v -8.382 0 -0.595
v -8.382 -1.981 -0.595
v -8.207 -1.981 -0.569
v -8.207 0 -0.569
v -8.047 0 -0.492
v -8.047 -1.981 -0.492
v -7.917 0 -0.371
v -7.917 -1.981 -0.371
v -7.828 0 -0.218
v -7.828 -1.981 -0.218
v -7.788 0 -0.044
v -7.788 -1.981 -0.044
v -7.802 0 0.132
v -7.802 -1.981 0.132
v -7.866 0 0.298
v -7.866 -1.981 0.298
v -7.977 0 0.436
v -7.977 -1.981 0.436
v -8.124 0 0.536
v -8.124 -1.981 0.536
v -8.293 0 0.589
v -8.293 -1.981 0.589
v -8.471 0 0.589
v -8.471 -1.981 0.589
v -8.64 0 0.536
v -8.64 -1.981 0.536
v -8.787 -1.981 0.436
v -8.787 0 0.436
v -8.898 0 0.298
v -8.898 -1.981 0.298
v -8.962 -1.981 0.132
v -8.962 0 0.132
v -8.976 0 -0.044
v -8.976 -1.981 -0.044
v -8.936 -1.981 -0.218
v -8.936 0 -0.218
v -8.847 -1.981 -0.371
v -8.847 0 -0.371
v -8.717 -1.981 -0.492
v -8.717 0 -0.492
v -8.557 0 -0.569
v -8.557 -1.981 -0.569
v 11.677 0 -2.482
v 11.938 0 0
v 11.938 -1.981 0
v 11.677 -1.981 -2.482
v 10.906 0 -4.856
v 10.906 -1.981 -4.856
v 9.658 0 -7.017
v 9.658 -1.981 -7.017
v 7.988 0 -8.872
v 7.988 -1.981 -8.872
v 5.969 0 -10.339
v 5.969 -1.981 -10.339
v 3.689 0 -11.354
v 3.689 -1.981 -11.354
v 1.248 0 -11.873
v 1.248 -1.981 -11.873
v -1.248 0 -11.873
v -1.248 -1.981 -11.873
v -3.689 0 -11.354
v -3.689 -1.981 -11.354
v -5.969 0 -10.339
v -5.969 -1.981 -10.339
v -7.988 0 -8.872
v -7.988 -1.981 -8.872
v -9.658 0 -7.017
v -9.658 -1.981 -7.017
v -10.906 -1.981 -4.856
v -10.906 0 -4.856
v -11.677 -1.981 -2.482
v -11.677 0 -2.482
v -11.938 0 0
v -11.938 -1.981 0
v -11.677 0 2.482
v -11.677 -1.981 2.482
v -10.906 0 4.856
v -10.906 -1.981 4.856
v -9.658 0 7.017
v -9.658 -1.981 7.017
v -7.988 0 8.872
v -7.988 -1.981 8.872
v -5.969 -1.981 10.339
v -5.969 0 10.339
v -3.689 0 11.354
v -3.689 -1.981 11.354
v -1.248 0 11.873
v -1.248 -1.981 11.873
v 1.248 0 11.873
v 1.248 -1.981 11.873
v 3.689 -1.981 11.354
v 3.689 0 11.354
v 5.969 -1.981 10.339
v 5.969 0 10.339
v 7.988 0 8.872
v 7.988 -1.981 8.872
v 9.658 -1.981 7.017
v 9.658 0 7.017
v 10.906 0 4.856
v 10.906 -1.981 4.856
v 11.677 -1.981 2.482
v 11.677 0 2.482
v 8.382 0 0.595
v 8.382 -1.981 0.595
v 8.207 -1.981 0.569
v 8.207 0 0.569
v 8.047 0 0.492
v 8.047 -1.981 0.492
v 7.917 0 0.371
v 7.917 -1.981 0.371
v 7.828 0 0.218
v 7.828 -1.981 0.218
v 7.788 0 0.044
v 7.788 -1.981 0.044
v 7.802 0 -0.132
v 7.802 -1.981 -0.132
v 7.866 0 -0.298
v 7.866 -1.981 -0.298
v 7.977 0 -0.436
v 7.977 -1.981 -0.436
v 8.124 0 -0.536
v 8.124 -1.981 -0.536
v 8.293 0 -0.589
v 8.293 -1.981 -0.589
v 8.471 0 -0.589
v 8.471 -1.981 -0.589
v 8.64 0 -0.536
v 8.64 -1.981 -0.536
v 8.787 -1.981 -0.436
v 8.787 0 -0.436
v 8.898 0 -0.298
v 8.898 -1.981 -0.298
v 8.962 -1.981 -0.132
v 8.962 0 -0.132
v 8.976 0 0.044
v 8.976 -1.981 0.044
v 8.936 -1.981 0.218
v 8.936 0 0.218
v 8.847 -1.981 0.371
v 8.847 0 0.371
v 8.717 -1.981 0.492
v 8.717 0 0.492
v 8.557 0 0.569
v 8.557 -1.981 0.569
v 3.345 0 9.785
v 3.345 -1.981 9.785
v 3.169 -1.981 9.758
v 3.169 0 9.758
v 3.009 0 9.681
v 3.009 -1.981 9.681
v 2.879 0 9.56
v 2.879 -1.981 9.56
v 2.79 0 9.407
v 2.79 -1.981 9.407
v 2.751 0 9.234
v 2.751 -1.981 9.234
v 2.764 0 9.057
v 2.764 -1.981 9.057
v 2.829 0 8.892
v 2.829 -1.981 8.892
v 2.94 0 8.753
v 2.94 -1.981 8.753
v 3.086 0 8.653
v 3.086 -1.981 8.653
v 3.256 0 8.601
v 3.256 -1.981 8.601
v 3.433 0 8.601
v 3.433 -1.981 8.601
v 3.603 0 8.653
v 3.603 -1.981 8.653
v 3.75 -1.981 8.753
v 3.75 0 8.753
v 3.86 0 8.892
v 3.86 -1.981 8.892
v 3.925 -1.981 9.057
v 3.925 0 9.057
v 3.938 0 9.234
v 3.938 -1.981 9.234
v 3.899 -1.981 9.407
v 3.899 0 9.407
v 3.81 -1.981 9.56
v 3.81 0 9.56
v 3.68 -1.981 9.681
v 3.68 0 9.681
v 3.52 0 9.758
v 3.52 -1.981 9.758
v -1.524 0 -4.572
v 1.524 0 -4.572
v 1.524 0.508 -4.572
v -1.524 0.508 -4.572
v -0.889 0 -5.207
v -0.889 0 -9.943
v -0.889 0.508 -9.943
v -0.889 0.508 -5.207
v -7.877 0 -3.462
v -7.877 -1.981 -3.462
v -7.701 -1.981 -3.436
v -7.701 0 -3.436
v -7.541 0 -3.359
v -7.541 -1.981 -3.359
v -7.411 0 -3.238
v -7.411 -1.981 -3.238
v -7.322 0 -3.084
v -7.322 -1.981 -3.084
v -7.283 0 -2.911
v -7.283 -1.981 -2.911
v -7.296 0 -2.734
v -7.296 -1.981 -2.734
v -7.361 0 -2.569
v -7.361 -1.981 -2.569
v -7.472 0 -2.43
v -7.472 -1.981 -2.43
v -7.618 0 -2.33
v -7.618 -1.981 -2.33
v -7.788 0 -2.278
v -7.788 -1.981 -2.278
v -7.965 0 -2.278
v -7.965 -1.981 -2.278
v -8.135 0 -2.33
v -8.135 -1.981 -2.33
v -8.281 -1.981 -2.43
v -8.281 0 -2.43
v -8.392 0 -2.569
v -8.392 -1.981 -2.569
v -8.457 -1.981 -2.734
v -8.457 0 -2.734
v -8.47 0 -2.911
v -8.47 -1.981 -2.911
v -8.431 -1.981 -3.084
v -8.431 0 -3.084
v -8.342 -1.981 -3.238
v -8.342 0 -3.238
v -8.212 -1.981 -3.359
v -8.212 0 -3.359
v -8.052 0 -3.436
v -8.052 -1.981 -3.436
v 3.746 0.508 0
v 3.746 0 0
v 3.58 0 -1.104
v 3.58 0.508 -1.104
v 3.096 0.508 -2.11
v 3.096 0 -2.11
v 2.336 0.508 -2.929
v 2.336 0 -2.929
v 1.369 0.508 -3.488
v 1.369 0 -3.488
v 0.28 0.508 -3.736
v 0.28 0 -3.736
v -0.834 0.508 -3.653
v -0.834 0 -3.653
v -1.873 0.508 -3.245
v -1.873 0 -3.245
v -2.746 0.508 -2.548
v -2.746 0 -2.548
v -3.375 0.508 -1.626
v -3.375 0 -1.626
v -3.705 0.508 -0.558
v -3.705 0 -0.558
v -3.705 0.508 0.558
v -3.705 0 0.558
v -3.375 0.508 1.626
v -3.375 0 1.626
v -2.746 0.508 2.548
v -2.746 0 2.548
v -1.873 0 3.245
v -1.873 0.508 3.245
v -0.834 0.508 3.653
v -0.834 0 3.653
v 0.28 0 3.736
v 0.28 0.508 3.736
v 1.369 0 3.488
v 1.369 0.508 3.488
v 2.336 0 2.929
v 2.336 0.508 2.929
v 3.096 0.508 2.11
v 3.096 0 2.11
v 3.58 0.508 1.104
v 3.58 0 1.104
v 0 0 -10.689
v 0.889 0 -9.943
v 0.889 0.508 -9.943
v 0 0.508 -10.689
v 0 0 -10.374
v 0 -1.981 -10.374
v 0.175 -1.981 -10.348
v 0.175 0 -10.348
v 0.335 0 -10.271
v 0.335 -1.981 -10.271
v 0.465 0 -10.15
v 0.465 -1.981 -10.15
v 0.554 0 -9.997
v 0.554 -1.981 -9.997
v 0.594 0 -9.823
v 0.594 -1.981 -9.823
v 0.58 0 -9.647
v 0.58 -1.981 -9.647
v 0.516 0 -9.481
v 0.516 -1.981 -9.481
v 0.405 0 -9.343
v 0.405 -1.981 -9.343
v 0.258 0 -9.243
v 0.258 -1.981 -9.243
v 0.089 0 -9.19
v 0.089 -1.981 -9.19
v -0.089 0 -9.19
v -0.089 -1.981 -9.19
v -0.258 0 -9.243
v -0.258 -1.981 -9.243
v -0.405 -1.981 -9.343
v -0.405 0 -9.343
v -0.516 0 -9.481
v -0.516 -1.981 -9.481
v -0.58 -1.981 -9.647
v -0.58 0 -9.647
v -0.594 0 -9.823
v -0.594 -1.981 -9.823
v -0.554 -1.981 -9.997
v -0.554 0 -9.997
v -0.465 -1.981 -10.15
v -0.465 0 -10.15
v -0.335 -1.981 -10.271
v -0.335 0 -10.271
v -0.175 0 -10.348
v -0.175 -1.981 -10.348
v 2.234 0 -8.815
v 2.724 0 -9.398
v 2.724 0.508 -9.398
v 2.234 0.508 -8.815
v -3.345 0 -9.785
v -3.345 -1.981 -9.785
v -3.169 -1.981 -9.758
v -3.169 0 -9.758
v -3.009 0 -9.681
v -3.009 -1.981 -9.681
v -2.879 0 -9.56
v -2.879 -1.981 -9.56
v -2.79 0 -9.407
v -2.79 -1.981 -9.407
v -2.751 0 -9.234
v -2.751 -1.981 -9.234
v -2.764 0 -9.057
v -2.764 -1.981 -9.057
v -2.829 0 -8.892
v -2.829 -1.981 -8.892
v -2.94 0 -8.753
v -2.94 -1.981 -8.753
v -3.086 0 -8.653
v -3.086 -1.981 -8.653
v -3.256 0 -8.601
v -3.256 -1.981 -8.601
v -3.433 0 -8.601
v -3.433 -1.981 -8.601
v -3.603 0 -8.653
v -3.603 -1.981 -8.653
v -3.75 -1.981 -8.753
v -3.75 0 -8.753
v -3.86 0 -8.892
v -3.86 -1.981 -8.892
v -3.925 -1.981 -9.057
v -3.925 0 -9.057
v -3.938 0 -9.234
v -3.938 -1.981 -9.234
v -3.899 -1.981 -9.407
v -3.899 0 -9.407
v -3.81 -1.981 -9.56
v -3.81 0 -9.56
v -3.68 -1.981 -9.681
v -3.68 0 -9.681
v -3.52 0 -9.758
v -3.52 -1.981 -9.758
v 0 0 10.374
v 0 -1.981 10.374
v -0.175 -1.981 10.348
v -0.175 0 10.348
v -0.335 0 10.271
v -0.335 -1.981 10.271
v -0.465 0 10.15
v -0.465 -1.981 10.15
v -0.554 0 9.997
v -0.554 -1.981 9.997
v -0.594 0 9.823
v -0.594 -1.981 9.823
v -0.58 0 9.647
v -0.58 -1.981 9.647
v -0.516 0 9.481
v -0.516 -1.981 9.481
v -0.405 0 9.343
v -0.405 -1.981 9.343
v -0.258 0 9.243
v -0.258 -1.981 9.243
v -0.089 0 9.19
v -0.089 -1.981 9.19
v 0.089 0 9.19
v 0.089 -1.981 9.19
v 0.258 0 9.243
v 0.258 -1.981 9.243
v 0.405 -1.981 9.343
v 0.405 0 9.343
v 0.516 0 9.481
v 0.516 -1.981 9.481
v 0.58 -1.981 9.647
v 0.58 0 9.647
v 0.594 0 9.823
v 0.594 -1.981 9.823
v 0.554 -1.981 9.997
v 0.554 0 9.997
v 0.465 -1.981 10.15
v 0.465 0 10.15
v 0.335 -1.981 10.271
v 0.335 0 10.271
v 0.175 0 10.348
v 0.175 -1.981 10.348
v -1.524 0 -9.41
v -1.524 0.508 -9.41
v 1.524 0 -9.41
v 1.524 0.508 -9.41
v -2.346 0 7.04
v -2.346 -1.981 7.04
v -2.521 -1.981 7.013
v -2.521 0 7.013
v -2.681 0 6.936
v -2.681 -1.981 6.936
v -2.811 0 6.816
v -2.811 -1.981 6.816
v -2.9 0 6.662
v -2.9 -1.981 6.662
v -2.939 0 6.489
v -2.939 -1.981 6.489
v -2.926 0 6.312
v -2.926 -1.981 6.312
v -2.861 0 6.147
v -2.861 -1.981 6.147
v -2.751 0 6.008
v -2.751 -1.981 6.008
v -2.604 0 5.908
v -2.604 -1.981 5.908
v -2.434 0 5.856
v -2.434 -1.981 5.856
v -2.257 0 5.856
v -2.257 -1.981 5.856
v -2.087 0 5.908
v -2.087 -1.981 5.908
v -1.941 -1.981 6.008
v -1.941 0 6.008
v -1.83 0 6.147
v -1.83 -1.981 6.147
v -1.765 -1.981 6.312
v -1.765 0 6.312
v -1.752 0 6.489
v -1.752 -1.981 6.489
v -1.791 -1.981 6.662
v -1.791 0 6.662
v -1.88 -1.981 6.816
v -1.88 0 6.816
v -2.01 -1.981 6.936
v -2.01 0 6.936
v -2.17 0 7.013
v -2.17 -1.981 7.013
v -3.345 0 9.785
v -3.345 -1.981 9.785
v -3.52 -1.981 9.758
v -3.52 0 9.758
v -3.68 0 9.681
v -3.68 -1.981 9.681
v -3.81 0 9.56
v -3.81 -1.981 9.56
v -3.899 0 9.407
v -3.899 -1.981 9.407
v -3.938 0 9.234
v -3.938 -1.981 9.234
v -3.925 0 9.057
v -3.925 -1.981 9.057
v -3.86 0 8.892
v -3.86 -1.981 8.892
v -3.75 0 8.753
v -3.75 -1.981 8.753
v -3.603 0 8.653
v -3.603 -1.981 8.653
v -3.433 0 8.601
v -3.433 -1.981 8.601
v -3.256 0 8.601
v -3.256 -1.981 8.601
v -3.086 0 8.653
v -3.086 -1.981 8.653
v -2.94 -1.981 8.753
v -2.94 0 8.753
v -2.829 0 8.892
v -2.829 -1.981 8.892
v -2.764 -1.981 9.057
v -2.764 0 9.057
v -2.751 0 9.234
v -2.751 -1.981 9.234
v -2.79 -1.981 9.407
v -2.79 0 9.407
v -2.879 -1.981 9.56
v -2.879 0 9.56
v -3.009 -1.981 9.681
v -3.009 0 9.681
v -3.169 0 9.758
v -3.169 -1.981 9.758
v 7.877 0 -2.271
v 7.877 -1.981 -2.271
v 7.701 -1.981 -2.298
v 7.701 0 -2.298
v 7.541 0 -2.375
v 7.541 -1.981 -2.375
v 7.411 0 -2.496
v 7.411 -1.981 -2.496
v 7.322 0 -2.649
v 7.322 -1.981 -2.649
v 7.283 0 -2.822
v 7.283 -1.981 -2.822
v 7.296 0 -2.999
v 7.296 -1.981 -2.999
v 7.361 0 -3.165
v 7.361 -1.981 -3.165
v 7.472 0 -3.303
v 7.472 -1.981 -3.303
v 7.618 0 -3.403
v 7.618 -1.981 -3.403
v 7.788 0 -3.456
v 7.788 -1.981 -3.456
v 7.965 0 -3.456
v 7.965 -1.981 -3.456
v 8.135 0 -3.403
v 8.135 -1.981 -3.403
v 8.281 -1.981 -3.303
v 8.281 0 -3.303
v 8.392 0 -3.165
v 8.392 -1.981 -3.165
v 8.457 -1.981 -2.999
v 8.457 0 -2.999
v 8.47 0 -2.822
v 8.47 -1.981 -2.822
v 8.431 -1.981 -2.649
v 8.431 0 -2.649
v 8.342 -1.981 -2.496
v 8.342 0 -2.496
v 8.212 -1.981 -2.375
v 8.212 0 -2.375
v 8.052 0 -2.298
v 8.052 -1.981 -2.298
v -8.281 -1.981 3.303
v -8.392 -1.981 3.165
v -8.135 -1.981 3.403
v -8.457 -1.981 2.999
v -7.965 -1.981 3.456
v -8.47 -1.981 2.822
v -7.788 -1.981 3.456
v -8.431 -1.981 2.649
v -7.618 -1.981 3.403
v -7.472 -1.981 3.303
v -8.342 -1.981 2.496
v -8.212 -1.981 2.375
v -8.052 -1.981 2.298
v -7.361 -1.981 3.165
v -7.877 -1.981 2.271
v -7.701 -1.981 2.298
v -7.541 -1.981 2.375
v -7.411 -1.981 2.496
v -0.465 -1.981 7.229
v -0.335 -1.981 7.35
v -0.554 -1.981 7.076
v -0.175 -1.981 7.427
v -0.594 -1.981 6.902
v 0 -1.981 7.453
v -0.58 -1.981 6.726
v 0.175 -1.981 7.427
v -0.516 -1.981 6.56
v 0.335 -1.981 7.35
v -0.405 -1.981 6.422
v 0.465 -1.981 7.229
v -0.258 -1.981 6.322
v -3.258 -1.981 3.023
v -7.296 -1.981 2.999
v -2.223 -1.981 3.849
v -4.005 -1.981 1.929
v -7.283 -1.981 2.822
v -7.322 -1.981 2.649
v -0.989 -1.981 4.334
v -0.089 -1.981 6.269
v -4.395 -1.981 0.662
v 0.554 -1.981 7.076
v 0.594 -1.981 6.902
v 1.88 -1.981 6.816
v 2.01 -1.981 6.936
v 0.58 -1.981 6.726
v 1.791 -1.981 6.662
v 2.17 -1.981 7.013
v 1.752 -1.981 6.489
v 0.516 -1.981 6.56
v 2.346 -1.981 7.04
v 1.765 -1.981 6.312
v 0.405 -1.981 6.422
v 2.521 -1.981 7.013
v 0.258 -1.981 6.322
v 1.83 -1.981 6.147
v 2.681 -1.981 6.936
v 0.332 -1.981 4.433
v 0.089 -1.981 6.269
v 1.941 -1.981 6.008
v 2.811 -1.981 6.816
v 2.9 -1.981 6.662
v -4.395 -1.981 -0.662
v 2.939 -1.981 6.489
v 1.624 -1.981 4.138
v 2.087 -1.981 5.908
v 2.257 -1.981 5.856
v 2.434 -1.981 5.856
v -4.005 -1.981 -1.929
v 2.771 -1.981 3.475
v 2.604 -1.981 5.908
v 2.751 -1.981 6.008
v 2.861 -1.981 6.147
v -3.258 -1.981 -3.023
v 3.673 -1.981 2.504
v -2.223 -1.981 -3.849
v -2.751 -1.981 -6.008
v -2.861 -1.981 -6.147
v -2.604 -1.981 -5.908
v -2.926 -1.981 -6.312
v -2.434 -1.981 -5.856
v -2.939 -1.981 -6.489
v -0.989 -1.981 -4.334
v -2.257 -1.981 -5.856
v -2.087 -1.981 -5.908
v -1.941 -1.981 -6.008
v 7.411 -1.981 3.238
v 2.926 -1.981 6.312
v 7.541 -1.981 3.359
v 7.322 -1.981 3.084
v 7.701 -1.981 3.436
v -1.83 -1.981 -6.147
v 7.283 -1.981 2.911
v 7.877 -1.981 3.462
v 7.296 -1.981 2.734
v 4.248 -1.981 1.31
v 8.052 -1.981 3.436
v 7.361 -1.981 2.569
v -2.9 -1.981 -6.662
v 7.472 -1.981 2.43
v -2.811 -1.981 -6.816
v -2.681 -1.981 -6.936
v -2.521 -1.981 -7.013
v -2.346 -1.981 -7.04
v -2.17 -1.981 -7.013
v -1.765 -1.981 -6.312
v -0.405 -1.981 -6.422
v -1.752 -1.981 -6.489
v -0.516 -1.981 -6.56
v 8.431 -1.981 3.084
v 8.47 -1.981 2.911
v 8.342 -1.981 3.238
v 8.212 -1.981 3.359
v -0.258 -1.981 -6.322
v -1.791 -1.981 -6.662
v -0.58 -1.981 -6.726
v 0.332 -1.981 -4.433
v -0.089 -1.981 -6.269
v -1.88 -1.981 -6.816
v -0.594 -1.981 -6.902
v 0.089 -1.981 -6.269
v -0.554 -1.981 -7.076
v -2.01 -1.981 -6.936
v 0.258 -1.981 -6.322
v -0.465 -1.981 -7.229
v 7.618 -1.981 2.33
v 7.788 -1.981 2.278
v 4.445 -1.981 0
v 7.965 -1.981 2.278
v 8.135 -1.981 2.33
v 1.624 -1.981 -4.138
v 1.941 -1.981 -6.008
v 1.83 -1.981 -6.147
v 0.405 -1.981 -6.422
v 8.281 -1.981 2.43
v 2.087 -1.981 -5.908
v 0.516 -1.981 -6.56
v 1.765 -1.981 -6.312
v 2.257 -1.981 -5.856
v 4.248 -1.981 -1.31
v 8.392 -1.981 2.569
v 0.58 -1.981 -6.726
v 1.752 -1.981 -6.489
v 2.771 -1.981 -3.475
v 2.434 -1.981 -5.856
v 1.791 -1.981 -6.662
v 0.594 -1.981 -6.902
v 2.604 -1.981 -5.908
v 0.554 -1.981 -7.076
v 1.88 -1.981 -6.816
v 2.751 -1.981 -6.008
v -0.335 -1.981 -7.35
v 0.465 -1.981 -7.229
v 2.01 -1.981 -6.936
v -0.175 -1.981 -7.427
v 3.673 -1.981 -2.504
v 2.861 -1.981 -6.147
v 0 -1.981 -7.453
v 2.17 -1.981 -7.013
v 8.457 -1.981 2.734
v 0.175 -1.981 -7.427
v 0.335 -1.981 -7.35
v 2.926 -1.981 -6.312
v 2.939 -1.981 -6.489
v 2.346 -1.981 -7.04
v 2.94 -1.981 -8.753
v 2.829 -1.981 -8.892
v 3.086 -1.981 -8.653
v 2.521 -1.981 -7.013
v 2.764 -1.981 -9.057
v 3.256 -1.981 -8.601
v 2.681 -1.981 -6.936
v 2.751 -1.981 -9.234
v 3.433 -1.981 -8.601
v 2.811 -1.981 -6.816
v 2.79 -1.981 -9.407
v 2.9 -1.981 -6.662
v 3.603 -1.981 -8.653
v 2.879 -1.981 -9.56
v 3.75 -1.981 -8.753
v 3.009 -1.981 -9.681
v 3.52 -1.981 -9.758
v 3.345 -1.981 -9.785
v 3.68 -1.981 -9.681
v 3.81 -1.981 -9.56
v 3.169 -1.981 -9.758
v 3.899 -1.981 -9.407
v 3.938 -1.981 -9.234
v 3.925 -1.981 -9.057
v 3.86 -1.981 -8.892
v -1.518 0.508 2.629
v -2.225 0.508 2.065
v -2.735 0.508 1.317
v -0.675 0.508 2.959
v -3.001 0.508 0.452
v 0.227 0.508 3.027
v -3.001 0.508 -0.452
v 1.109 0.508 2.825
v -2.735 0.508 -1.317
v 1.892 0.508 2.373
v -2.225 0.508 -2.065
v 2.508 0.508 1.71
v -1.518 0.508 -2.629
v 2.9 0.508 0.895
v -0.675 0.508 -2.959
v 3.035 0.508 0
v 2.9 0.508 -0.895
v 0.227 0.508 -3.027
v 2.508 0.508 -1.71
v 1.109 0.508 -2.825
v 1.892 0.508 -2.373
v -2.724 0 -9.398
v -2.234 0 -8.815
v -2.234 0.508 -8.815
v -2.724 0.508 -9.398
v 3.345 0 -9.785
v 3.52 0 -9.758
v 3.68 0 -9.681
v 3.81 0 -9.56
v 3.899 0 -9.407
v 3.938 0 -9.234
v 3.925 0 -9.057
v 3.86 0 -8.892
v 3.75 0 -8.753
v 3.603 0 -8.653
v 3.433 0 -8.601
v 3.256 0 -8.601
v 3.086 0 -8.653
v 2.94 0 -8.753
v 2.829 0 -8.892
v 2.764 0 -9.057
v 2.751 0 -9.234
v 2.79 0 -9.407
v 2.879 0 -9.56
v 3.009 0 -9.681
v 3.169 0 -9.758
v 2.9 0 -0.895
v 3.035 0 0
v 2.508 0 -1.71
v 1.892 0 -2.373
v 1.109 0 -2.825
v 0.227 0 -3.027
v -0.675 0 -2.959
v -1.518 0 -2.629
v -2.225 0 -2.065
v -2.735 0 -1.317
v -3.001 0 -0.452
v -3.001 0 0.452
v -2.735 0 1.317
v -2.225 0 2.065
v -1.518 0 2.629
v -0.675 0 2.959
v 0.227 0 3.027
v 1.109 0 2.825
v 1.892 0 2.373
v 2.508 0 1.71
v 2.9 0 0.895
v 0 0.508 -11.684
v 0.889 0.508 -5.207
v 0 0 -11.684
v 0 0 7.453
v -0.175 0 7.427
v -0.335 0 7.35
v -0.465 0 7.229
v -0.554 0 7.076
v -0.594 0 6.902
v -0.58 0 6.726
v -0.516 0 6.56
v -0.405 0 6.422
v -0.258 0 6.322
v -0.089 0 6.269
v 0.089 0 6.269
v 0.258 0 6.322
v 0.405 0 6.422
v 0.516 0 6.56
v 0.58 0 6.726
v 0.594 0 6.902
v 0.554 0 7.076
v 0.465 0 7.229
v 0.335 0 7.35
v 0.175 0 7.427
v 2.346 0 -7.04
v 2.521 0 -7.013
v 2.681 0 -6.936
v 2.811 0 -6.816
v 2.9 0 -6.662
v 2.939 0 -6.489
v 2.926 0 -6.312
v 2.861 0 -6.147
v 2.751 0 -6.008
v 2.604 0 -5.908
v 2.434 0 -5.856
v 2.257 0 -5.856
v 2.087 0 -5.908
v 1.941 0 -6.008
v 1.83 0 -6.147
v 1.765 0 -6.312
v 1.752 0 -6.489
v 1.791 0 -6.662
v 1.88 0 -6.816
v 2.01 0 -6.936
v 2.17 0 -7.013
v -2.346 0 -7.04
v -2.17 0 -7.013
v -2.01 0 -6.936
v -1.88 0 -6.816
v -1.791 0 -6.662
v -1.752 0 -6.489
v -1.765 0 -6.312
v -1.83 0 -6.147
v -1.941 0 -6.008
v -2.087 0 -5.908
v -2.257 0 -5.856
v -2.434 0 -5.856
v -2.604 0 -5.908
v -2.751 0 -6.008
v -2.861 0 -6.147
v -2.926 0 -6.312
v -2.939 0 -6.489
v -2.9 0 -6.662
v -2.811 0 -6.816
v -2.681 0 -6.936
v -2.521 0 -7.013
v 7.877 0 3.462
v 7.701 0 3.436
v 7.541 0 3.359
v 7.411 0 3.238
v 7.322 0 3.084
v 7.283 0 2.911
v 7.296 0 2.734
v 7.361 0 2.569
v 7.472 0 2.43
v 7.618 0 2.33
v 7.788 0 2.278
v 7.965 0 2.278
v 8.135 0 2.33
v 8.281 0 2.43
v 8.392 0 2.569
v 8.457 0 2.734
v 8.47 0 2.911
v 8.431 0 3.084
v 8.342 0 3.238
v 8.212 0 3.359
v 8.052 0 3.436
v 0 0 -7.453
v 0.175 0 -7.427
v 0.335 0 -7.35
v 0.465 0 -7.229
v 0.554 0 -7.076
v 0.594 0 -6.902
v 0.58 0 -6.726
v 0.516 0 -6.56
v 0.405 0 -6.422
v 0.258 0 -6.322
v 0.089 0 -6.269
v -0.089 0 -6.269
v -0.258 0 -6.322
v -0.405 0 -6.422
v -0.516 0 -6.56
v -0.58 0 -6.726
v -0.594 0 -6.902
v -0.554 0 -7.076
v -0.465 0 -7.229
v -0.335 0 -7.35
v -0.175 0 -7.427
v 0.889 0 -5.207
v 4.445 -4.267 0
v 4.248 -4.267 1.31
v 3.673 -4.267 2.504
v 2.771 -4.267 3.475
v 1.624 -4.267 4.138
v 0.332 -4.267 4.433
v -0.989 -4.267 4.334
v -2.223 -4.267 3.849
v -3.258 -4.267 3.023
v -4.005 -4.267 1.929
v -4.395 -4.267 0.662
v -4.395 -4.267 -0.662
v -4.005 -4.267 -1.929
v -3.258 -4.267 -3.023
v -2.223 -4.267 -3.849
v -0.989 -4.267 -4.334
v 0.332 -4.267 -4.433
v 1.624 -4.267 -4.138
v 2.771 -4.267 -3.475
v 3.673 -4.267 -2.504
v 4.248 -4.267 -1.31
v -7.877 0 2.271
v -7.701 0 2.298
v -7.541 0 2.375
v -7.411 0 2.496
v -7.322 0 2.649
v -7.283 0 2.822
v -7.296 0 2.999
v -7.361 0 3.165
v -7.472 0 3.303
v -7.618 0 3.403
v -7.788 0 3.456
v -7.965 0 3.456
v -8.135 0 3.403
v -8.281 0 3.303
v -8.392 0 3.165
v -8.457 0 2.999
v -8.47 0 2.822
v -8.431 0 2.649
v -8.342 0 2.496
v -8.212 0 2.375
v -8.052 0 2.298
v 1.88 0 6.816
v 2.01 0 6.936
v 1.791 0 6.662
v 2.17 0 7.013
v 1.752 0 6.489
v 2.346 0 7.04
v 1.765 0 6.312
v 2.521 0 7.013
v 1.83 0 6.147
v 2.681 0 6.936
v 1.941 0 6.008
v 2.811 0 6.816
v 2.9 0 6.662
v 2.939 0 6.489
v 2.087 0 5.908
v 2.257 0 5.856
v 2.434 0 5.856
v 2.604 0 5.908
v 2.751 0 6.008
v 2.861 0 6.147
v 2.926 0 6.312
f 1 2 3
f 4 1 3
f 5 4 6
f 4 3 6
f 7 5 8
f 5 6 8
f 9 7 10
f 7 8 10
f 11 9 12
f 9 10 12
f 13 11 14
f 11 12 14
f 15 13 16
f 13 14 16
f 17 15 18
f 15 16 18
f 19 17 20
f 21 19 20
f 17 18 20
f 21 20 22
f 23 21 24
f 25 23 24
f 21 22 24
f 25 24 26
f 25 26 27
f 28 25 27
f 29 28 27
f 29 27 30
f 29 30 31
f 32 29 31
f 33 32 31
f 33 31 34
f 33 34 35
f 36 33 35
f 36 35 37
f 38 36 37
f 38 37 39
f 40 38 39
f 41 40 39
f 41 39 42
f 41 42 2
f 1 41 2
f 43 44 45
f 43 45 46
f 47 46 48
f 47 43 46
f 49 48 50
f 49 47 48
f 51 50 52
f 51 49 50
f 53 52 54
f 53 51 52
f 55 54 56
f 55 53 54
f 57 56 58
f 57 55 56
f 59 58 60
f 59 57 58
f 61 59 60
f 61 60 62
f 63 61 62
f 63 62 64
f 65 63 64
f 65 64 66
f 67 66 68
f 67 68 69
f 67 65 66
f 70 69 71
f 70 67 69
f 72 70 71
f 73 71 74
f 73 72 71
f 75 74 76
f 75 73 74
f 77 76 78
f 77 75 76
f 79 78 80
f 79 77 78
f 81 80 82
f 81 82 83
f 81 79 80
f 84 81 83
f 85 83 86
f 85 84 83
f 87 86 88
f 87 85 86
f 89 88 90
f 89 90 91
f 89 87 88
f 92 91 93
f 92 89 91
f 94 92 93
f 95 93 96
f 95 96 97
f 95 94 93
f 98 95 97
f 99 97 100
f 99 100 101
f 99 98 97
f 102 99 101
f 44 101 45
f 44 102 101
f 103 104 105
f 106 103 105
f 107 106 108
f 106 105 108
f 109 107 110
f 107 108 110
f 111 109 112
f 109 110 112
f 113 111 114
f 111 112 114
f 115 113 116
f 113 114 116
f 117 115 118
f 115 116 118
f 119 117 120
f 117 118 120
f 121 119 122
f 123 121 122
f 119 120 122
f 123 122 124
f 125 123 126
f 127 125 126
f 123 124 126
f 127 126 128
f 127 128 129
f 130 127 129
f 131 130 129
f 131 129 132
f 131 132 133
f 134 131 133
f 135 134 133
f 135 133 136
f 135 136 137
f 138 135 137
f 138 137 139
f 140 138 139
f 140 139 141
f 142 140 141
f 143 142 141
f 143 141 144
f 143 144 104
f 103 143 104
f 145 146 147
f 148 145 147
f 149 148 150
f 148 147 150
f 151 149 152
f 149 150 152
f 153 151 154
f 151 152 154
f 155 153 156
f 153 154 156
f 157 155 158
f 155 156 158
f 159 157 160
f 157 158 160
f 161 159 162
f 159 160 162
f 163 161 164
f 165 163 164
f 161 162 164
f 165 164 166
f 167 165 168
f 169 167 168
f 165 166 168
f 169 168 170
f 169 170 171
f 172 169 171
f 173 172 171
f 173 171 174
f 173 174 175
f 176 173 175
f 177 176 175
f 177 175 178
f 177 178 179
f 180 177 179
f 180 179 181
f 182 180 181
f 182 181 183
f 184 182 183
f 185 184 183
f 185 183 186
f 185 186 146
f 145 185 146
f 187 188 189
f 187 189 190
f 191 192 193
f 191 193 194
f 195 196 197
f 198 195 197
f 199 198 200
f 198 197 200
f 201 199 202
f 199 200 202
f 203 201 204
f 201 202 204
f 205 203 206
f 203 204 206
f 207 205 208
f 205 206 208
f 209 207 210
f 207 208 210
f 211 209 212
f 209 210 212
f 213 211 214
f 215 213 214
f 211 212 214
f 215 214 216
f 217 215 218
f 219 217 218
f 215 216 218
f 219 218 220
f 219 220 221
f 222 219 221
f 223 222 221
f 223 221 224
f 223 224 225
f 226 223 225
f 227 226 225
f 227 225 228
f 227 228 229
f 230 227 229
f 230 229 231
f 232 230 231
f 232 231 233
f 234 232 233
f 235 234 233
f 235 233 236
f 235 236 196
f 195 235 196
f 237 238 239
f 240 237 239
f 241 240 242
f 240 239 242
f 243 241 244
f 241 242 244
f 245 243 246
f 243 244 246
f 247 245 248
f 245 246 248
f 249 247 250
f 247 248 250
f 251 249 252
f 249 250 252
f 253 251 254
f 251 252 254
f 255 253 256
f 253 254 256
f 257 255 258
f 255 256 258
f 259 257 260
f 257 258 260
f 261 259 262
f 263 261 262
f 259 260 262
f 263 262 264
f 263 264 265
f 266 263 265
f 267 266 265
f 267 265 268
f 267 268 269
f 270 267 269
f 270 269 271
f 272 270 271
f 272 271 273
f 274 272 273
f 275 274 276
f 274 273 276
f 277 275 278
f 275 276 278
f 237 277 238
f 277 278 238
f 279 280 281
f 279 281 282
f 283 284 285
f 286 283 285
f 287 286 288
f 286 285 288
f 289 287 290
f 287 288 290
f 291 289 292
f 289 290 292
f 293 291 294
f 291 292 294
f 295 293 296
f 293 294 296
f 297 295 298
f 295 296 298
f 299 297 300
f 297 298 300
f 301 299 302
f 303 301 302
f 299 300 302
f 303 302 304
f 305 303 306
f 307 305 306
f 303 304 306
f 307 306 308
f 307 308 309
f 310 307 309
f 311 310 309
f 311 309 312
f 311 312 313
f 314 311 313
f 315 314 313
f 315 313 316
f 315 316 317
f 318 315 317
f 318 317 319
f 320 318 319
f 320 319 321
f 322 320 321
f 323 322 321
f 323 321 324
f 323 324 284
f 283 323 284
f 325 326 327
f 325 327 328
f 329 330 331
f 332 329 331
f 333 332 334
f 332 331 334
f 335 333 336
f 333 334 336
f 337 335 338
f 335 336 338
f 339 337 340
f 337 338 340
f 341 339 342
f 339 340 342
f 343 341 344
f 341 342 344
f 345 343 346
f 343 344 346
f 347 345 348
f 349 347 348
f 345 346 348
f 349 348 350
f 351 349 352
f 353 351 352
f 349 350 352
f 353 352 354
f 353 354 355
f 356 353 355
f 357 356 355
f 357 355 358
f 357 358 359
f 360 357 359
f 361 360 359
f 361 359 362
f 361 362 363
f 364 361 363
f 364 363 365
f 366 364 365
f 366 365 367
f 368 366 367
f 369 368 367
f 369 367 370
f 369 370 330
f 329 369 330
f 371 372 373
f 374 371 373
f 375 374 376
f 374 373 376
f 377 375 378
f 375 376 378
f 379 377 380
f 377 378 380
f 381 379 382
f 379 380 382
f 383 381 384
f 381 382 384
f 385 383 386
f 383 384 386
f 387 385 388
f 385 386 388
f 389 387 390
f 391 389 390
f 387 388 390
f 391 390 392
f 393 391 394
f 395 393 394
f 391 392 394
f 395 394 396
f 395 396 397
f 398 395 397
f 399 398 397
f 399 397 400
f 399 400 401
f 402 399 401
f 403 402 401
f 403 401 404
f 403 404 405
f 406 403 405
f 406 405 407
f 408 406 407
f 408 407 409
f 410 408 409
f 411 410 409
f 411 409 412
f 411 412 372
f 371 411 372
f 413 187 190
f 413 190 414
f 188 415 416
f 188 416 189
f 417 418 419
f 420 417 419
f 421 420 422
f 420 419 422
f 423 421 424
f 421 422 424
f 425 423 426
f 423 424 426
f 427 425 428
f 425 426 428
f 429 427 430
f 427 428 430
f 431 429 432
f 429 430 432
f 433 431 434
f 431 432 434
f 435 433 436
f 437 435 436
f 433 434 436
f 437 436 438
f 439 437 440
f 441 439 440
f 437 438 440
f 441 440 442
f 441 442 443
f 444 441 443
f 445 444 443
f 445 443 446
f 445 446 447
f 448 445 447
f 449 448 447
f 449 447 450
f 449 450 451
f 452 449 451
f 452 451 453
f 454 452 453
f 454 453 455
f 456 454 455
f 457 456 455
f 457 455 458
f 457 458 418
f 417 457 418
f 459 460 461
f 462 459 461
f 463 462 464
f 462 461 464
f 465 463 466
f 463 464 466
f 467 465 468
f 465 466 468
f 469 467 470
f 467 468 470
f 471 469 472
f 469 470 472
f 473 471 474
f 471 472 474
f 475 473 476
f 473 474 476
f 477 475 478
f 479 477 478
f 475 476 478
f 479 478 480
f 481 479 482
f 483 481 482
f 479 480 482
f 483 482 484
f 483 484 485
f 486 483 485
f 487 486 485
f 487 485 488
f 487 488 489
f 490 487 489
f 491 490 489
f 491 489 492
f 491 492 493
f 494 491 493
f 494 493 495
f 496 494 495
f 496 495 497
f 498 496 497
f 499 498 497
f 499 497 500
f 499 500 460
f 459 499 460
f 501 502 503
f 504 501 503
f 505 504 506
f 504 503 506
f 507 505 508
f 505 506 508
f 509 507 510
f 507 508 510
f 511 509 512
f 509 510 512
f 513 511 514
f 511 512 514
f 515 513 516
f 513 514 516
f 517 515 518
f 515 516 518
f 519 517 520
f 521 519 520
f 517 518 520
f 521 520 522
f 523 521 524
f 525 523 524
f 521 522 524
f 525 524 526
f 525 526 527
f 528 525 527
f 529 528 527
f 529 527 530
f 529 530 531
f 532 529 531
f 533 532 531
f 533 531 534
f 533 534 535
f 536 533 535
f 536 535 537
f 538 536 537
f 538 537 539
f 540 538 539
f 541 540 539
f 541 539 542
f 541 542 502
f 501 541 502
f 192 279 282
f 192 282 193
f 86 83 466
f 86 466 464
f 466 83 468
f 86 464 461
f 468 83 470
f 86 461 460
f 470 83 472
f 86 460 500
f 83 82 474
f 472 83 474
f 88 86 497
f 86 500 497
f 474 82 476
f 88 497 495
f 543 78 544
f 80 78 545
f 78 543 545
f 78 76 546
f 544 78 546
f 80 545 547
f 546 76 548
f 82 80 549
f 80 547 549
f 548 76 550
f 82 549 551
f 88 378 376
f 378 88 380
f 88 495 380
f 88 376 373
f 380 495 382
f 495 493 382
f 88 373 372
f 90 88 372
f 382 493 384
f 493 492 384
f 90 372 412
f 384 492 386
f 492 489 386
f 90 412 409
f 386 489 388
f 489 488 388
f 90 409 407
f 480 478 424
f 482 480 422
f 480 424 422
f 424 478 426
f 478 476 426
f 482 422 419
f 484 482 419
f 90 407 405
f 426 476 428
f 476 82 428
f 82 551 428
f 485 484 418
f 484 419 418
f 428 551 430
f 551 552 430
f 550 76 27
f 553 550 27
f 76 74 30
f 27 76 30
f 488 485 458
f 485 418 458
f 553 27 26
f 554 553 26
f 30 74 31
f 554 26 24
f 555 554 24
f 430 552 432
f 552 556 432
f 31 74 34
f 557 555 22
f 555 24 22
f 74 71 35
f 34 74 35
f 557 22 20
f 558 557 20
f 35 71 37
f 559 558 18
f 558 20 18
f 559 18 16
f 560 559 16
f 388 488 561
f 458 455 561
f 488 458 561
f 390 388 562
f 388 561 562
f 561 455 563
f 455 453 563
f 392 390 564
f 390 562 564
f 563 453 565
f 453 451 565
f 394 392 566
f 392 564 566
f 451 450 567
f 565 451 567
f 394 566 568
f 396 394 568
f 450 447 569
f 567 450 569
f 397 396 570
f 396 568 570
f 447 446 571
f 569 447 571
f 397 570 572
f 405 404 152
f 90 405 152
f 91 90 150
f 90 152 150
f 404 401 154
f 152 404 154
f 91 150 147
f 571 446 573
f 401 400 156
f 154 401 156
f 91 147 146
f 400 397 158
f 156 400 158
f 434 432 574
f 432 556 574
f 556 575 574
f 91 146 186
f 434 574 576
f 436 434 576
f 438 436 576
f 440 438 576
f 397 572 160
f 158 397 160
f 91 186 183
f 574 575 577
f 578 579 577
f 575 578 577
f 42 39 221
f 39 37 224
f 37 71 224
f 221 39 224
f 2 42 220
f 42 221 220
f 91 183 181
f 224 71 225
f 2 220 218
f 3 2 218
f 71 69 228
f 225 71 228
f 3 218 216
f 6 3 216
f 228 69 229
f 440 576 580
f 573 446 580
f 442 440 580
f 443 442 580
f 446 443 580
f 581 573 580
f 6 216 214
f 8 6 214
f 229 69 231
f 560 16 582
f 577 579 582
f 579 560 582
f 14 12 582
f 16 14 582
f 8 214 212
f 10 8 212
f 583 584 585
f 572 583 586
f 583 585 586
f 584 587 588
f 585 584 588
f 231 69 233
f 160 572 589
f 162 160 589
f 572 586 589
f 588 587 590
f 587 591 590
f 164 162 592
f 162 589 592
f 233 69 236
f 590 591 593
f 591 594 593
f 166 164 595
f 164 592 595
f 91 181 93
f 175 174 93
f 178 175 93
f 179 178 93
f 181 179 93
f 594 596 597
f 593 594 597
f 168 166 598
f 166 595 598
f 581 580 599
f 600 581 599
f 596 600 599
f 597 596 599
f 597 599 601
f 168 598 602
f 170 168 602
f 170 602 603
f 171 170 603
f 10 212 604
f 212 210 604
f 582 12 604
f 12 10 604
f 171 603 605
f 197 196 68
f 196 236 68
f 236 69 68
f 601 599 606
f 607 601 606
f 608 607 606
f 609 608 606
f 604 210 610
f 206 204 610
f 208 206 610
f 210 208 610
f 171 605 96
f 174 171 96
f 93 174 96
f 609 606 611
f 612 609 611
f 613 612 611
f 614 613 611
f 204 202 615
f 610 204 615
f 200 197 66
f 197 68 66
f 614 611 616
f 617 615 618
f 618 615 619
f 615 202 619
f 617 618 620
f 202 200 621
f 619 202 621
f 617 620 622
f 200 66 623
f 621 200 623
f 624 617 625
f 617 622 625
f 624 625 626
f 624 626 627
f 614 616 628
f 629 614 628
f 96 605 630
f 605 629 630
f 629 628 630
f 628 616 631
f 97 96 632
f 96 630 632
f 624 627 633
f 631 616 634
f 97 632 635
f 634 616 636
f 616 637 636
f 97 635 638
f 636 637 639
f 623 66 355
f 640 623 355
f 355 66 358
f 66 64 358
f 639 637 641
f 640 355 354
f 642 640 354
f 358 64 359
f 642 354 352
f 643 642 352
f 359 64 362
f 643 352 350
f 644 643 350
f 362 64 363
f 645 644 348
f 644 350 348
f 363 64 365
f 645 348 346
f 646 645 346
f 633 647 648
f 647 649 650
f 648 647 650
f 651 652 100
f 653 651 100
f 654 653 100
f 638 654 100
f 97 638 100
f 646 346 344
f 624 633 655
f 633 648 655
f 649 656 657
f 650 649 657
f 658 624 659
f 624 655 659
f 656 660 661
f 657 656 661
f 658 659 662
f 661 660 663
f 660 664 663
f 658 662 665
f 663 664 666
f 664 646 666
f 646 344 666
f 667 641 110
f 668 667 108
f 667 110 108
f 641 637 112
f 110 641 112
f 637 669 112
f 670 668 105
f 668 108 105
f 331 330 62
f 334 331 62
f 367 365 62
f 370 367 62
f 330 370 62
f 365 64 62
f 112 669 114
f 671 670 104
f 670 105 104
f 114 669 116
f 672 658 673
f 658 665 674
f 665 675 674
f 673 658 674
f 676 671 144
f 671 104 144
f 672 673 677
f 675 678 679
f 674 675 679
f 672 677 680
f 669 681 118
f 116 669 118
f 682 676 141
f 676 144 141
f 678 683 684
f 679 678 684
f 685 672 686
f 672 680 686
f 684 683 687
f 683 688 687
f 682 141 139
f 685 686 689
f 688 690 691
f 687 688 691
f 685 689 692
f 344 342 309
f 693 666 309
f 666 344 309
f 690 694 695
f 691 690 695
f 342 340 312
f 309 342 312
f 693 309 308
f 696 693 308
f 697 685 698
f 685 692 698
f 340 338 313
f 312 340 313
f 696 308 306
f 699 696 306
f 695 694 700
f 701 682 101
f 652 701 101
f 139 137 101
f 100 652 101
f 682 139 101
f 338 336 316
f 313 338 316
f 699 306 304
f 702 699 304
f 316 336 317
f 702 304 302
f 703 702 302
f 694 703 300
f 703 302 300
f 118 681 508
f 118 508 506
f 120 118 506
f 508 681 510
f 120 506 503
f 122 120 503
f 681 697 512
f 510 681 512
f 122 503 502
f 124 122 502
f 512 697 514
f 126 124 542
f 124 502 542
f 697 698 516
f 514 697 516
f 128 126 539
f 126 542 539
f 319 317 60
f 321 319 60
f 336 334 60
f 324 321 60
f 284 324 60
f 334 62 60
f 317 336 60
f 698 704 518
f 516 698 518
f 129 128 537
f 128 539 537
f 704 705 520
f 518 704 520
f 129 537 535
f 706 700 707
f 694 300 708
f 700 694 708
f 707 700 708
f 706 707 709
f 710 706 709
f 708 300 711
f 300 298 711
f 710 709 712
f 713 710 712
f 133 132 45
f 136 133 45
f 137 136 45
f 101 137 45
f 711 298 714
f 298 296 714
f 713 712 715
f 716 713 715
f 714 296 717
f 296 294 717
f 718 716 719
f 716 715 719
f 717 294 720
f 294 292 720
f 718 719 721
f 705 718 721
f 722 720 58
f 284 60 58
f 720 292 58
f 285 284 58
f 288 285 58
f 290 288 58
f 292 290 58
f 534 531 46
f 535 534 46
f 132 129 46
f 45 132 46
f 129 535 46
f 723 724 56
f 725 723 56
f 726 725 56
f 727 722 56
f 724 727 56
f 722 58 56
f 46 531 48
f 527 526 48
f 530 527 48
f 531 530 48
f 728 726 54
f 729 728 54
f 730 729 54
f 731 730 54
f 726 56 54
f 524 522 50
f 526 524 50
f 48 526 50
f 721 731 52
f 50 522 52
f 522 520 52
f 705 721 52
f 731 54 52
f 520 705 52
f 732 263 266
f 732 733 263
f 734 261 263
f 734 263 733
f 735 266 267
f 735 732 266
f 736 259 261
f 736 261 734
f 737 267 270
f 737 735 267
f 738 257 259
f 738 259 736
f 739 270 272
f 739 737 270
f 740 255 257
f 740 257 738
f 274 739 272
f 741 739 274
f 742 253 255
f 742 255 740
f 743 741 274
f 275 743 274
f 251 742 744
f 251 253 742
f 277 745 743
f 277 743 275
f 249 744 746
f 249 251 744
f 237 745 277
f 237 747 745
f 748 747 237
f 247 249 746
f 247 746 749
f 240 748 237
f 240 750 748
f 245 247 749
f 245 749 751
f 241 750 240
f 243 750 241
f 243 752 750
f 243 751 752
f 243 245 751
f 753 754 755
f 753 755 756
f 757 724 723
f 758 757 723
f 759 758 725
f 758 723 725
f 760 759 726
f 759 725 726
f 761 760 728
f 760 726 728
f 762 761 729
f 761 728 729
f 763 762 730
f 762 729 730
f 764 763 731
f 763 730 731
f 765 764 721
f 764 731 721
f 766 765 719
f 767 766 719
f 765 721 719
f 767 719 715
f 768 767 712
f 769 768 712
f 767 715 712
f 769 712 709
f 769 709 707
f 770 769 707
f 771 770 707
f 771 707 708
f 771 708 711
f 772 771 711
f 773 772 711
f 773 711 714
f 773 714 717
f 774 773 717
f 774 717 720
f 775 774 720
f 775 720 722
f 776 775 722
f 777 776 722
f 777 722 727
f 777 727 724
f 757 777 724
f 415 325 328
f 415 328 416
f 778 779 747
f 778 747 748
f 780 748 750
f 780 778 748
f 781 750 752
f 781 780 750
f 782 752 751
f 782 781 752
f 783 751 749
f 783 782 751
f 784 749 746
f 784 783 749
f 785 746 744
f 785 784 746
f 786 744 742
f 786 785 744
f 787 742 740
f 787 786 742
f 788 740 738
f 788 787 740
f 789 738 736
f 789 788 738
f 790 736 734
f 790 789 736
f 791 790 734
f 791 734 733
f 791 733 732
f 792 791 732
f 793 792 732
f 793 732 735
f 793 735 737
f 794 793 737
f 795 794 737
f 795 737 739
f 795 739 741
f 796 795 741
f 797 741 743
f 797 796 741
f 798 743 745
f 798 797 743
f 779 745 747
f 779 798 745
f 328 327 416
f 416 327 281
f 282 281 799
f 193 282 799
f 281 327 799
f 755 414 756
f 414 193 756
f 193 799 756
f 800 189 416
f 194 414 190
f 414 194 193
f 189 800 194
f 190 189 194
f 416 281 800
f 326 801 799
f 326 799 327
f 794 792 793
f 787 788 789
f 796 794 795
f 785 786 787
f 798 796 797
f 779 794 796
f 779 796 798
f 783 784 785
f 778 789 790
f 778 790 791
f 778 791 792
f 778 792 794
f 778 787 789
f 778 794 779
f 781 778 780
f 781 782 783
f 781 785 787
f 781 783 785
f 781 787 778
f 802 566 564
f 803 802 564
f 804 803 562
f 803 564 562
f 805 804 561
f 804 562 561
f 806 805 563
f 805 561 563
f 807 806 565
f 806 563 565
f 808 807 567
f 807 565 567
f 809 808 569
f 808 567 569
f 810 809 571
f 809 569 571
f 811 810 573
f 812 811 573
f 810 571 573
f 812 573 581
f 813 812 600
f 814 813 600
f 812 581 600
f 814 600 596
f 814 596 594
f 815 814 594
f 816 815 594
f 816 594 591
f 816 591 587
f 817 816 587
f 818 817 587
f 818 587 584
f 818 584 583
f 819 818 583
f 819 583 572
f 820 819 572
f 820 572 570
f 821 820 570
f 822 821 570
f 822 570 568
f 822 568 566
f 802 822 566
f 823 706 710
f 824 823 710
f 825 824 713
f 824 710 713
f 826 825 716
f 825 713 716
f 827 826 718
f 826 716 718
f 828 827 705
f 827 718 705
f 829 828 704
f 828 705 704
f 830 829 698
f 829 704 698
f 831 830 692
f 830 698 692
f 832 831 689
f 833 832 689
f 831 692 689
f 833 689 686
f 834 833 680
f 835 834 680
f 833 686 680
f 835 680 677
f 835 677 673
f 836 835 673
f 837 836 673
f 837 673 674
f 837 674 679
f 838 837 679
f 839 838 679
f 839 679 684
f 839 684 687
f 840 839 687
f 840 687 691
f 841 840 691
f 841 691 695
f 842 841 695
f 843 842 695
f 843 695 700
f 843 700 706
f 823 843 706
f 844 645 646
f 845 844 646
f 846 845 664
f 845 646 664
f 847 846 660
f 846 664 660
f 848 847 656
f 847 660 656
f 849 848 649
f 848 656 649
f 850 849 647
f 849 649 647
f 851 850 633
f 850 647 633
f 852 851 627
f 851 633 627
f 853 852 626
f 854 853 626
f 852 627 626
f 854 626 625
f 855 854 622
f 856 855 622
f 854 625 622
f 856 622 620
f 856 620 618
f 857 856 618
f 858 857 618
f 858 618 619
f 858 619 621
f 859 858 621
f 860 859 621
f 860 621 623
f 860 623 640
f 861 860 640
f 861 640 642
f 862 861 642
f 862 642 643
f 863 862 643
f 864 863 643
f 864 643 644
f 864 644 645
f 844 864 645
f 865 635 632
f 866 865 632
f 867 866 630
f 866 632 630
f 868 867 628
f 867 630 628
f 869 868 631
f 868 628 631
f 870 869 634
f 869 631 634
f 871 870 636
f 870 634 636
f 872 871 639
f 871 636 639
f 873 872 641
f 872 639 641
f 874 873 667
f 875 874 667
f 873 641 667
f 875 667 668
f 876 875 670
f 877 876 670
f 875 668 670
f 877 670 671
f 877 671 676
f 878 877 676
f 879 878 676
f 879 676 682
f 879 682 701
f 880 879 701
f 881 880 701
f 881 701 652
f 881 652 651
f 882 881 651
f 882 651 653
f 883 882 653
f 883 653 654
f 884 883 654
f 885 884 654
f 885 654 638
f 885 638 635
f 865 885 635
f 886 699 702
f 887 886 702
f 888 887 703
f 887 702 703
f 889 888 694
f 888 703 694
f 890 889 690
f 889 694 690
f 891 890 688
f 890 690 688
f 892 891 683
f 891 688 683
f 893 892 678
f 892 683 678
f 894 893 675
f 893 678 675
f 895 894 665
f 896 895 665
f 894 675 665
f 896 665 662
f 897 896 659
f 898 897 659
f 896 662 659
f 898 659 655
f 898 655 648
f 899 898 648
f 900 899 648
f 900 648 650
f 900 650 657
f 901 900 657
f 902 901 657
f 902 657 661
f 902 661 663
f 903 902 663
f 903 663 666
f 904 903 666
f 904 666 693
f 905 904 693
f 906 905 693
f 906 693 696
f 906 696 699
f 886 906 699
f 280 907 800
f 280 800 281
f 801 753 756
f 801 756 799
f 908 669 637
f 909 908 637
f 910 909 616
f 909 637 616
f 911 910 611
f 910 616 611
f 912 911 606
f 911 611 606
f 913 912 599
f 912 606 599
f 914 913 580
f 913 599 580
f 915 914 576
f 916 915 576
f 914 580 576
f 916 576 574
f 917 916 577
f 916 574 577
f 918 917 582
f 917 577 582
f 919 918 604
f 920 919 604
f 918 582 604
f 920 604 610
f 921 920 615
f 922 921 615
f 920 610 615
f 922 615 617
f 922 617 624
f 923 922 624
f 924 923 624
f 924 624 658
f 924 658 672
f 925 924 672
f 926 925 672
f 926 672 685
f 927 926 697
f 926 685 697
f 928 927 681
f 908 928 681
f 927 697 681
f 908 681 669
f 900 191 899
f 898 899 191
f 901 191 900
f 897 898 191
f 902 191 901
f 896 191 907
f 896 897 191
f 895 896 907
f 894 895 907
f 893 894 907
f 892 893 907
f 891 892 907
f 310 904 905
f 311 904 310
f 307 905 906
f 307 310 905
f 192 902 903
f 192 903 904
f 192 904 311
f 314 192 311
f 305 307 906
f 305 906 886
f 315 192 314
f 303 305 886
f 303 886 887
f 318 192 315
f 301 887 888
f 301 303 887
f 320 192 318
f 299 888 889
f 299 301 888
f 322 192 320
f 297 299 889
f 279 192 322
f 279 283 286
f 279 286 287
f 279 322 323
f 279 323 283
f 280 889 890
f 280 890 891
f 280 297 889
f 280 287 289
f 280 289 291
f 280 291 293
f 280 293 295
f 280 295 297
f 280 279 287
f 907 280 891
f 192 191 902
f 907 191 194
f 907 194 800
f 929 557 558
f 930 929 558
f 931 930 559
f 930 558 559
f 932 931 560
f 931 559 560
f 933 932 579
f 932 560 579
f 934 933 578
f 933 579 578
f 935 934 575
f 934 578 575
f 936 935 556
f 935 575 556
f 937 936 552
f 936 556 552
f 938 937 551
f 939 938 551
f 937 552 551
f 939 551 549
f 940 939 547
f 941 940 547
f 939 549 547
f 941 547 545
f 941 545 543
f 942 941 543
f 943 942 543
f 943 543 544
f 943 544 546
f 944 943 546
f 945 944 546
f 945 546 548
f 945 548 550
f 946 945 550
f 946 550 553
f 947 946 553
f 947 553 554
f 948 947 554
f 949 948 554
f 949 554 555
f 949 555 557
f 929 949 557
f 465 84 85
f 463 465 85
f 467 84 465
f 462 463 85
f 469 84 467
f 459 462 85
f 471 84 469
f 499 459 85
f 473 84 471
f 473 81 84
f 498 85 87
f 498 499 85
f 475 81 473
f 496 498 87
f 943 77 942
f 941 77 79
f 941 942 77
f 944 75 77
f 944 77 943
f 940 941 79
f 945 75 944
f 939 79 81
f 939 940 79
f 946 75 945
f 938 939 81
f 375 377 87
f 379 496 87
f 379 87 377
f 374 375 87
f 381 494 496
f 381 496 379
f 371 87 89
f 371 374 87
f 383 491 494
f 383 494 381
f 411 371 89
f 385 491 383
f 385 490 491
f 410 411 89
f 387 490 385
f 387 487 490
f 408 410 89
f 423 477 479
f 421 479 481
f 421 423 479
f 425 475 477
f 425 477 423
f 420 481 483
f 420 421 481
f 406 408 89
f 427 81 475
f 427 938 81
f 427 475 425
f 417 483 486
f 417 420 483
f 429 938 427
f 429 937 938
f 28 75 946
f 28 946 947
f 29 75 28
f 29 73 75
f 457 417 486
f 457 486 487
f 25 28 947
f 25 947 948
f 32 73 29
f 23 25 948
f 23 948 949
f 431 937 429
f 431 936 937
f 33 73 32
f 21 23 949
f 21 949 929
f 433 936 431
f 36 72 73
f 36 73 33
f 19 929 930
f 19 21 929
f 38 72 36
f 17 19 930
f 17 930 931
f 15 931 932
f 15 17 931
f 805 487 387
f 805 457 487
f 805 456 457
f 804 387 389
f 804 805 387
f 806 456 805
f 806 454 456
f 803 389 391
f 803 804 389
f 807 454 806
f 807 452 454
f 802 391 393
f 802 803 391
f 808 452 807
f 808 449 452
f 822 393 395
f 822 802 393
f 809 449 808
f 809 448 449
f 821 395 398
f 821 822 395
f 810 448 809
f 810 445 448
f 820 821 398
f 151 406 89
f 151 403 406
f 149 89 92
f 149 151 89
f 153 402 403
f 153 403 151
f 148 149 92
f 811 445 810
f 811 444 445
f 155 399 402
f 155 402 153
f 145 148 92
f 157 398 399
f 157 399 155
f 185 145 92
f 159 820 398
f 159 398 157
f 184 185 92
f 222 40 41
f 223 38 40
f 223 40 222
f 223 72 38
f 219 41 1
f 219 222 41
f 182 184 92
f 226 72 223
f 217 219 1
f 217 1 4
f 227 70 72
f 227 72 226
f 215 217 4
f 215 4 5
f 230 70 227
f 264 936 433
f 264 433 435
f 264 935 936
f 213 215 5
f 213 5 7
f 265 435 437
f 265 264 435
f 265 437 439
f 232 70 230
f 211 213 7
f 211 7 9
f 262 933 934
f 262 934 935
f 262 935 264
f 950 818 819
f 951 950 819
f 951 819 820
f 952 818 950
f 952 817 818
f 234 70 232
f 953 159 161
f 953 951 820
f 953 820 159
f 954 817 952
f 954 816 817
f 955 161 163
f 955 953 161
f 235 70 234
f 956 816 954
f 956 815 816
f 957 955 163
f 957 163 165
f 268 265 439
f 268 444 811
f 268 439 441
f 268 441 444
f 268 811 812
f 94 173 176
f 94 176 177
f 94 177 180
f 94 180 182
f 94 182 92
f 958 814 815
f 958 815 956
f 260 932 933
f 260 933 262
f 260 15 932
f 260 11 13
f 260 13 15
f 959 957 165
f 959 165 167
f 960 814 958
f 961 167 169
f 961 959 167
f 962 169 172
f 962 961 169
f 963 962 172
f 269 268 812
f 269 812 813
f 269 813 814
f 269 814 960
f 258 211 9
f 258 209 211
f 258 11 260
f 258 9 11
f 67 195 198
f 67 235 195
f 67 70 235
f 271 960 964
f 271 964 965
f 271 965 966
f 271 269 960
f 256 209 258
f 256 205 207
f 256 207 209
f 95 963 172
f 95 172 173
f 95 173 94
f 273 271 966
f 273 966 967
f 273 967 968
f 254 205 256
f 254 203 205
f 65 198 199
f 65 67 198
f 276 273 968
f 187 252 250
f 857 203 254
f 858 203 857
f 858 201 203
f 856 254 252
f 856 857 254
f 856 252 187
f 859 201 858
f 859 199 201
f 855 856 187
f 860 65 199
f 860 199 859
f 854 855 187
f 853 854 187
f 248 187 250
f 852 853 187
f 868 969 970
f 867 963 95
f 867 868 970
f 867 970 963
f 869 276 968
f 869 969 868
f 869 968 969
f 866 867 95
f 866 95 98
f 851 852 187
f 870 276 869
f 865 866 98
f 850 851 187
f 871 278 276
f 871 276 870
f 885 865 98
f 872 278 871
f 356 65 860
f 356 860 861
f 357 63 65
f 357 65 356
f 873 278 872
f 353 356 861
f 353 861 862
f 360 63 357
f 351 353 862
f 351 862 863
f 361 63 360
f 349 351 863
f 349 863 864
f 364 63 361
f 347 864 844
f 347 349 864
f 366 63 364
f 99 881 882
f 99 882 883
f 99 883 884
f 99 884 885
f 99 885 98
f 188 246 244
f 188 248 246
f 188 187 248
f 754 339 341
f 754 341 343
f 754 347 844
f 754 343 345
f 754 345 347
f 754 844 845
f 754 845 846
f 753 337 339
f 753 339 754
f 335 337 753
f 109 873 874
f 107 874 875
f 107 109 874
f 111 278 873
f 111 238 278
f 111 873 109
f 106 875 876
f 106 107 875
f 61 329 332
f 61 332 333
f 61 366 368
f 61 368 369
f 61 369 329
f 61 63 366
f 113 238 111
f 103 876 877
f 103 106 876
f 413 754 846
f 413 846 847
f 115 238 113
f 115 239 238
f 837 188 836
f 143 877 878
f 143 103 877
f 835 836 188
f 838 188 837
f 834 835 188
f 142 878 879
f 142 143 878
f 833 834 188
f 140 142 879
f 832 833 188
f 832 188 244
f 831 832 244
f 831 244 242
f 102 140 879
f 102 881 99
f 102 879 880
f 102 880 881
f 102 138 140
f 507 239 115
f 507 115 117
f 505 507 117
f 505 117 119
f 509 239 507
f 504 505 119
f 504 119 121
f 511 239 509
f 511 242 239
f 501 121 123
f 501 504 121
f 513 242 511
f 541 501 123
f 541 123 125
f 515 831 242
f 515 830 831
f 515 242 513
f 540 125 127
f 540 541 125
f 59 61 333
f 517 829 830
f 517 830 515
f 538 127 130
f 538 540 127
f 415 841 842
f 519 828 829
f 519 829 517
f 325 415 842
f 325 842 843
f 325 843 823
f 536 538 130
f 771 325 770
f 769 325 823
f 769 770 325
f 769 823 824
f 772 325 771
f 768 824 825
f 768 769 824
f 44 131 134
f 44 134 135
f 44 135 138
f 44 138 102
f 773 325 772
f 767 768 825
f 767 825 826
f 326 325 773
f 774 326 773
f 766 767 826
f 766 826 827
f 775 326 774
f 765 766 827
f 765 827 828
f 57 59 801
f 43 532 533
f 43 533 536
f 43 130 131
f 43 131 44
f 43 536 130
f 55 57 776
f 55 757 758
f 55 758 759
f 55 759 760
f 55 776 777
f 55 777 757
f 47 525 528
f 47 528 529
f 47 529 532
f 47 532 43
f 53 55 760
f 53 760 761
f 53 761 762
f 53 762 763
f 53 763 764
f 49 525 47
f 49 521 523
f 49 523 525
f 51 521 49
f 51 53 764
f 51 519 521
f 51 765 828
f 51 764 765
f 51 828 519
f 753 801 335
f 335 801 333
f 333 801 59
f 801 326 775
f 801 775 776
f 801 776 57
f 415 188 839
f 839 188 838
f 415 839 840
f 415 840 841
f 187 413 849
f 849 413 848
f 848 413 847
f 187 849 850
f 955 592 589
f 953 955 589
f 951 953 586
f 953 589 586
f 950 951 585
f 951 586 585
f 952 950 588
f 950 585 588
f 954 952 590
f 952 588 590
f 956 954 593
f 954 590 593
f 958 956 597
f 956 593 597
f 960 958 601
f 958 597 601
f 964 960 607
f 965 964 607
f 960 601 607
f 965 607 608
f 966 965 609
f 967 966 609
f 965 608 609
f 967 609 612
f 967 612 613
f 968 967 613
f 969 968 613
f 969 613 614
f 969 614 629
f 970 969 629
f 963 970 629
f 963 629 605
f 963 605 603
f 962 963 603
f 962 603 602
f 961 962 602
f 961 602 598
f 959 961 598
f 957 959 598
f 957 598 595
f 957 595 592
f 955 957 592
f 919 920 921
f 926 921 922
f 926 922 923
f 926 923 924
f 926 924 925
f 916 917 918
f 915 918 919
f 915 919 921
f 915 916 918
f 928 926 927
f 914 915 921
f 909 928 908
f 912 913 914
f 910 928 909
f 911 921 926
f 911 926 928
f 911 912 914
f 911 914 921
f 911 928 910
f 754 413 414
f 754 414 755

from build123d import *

# Parameters (mm, degrees)
SKETCH1_R                       = 11.938
EXTRUDE1_DEPTH                  = 1.9812
SKETCH2_R                       = 4.445
EXTRUDE2_DEPTH                  = 2.286
F_3_64_0_04688_DIAMETER_HOLE1_D = 1.190752
CIRPATTERN1_COUNT               = 2
SKETCH6_R                       = 3.7465
SKETCH6_R_2                     = 3.0353
EXTRUDE4_DEPTH                  = 0.508
EXTRUDE3_DEPTH                  = 0.508


with BuildPart() as part:
    # Sketch1 → Extrude1 (new body)
    with BuildSketch(Plane(origin=(0, 0, 0), x_dir=(1, 0, 0), z_dir=(0, 1, 0))):
        Circle(SKETCH1_R)
    extrude(amount=-EXTRUDE1_DEPTH)

    # Sketch2 → Extrude2 (add)
    with BuildSketch(Plane.XZ.offset(1.9812)):
        Circle(SKETCH2_R)
    extrude(amount=EXTRUDE2_DEPTH)

    # 3/64 (0.04688) Diameter Hole1 (through all)
    with Locations(Plane(origin=(0, 0, -6.858), x_dir=(0, 0, 1), z_dir=(0, 1, 0))):
        with Locations((0, 0), (0.413588007, -2.345574143), (0.413588007, 2.345574143), (-2.331254139, 3.344614982), (-2.921, 0), (-2.331254139, -3.344614982), (3.991187159, -7.876503547), (6.858, -8.382), (9.724812841, -7.876503547)):
            f_3_64_0_04688_diameter_hole1 = Hole(F_3_64_0_04688_DIAMETER_HOLE1_D / 2)

    # CirPattern1: 3/64 (0.04688) Diameter Hole1 ×2 about axis
    cirpattern1_axis = Axis((0, 0, 0), (0, 1, 0))
    for i in range(1, CIRPATTERN1_COUNT):
        add(f_3_64_0_04688_diameter_hole1.rotate(cirpattern1_axis, i * 360 / CIRPATTERN1_COUNT), mode=Mode.SUBTRACT)

    # Sketch6 → Extrude4 (add)
    with BuildSketch(Plane(origin=(0, 0, 0), x_dir=(1, 0, 0), z_dir=(0, 1, 0))):
        Circle(SKETCH6_R)
        Circle(SKETCH6_R_2, mode=Mode.SUBTRACT)
    extrude(amount=EXTRUDE4_DEPTH)

    # Sketch5 → Extrude3 (add)
    with BuildSketch(Plane(origin=(0, 0, 0), x_dir=(1, 0, 0), z_dir=(0, 1, 0))):
        Polygon((-2.72405404, 9.39824726), (0, 11.684), (2.72405404, 9.39824726), (2.234249881, 8.814521394), (1.524, 9.410491808), (1.524, 4.572), (-1.524, 4.572), (-1.524, 9.410491808), (-2.234249881, 8.814521394), align=None)
        Polygon((0, 10.689279646), (-0.889, 9.943320073), (-0.889, 5.207), (0.889, 5.207), (0.889, 9.943320073), align=None, mode=Mode.SUBTRACT)
    extrude(amount=EXTRUDE3_DEPTH)


solid = part.part
